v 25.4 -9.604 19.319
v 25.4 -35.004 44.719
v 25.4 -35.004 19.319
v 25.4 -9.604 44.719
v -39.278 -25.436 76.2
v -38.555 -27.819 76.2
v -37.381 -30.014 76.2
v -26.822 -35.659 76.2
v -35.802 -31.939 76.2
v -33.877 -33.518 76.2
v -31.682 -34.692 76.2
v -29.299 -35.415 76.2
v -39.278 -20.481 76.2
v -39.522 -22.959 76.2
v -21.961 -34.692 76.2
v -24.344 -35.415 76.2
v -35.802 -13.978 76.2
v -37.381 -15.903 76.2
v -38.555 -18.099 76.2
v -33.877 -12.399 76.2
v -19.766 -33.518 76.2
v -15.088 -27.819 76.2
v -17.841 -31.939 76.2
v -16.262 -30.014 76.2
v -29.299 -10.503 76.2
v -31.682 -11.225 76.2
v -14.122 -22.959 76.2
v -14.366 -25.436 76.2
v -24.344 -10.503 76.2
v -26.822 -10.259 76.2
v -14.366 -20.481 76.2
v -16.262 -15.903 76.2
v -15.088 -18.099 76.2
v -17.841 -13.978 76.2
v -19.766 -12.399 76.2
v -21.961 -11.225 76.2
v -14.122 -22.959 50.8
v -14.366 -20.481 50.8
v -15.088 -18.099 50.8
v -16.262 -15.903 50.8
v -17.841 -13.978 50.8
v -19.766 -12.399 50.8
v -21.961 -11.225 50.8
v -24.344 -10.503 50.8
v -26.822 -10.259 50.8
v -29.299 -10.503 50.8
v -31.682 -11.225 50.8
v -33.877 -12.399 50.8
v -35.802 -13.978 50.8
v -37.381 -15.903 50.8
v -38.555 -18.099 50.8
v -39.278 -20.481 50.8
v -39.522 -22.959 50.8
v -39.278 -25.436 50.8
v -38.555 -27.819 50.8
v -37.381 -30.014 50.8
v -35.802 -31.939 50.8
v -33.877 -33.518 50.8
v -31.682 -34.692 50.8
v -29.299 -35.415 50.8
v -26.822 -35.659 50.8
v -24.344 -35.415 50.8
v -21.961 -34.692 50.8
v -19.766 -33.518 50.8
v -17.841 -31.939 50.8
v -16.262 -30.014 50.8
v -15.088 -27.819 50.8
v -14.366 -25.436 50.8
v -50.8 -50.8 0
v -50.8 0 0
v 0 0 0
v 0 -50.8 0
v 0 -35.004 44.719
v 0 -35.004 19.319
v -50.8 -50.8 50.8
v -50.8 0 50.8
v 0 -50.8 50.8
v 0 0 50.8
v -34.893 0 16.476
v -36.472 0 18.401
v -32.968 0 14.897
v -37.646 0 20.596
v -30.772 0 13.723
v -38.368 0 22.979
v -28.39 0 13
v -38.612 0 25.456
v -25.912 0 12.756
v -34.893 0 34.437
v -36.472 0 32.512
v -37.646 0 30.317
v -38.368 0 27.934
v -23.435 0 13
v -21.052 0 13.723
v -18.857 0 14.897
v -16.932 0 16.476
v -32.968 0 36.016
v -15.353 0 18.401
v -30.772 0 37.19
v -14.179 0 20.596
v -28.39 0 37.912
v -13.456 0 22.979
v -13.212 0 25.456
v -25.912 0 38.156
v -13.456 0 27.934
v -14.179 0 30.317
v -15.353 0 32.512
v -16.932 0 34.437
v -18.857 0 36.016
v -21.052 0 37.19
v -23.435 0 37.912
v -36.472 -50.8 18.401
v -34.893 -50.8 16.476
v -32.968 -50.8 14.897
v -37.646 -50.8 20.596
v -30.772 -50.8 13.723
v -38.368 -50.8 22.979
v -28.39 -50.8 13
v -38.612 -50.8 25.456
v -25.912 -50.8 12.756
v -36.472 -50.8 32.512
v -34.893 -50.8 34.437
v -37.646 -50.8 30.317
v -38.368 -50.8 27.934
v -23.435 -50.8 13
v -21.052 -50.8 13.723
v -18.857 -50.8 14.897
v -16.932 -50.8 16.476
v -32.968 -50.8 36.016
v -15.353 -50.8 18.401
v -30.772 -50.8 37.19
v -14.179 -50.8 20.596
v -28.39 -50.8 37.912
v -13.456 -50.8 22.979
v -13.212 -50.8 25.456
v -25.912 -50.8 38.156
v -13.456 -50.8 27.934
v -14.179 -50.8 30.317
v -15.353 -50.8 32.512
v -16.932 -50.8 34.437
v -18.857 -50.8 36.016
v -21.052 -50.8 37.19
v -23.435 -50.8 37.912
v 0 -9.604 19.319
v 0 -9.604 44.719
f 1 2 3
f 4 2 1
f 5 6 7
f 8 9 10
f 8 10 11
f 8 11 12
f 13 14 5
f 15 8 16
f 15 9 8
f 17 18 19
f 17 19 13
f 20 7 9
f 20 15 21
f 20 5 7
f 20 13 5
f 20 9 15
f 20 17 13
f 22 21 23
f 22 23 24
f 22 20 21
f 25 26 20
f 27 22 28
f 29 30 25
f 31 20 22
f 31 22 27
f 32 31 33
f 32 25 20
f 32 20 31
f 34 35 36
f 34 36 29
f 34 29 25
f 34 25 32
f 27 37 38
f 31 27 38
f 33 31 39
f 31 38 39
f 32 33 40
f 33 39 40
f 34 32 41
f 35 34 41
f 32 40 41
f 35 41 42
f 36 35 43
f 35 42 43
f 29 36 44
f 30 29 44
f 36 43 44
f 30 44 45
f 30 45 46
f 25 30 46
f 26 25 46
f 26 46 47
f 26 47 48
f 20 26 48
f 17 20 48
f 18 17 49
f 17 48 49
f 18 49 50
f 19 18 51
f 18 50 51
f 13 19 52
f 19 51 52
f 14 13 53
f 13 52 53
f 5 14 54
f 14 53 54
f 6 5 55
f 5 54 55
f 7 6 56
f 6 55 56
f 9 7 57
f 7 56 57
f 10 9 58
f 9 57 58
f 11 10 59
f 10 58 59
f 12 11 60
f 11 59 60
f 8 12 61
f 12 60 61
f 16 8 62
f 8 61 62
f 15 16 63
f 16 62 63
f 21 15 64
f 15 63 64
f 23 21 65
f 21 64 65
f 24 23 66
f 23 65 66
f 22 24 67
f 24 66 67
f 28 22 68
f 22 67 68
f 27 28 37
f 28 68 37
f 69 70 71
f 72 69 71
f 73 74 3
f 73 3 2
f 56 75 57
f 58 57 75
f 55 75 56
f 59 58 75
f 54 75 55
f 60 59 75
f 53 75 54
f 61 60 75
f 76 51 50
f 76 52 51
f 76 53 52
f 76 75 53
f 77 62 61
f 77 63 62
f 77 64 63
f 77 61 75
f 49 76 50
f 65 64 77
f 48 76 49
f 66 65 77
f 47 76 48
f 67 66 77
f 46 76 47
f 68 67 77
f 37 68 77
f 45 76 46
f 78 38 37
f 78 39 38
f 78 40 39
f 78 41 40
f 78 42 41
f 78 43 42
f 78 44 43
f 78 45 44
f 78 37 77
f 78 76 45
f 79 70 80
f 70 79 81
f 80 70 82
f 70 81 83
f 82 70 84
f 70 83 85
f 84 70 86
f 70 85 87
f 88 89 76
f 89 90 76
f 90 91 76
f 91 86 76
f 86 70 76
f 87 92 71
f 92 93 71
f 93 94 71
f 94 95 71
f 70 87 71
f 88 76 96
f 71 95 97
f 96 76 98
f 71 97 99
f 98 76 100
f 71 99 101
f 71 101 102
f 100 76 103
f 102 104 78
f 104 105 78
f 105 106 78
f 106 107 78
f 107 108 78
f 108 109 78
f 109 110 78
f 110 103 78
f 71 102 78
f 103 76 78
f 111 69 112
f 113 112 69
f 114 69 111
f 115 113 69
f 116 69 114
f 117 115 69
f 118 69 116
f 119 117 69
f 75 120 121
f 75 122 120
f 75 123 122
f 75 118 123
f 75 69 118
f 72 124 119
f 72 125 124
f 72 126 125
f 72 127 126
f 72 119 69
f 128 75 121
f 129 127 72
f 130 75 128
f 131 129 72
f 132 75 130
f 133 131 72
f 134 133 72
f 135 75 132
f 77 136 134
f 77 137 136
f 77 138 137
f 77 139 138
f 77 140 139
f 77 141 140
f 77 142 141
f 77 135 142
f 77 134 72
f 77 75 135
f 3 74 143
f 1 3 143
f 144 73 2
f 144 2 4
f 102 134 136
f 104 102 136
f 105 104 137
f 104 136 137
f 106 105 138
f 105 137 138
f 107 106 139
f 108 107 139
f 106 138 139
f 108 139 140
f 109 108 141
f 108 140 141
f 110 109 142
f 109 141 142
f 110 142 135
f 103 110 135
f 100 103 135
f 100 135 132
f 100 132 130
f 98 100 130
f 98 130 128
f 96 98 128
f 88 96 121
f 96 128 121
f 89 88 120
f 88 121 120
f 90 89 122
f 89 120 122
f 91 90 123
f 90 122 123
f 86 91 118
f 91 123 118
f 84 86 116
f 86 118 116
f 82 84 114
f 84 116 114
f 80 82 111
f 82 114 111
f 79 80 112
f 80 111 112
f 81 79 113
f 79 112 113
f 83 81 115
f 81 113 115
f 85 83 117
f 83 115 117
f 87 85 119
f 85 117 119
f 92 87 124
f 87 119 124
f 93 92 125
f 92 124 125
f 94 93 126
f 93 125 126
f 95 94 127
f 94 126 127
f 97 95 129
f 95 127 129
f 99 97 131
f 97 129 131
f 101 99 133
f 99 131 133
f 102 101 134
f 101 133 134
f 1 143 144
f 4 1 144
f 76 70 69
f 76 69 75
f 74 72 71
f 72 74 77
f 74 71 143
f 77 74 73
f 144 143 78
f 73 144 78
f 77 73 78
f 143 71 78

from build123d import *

# Parameters (mm, degrees)
F0_W     = 50.8
F0_H     = 50.8
F1_DEPTH = 50.8
F2_R     = 12.7
F3_DEPTH = 50.8
F4_W     = 25.4
F4_H     = 25.4
F5_DEPTH = 25.4
F6_R     = 12.7
F7_DEPTH = 25.4


with BuildPart() as f1:
    # F0 (on Front) → F1 (new body)
    with BuildSketch(Plane.XZ):
        with Locations((-25.4, 25.4)):
            Rectangle(F0_W, F0_H)
    extrude(amount=F1_DEPTH)

    # F2 (on face) → F3 (cut)
    with BuildSketch(Plane.XZ.offset(50.8)):
        with Locations((-25.91233, 25.456434)):
            Circle(F2_R)
    extrude(amount=-F3_DEPTH, mode=Mode.SUBTRACT)

    # F4 (on face) → F5 (join)
    with BuildSketch(Plane.YZ):
        with Locations((-22.304374, 32.019305)):
            Rectangle(F4_W, F4_H)
    extrude(amount=F5_DEPTH)

    # F6 (on face) → F7 (join)
    with BuildSketch(Plane.XY.offset(50.8)):
        with Locations((-26.821535, -22.958707)):
            Circle(F6_R)
    extrude(amount=F7_DEPTH)


solid = f1.part
